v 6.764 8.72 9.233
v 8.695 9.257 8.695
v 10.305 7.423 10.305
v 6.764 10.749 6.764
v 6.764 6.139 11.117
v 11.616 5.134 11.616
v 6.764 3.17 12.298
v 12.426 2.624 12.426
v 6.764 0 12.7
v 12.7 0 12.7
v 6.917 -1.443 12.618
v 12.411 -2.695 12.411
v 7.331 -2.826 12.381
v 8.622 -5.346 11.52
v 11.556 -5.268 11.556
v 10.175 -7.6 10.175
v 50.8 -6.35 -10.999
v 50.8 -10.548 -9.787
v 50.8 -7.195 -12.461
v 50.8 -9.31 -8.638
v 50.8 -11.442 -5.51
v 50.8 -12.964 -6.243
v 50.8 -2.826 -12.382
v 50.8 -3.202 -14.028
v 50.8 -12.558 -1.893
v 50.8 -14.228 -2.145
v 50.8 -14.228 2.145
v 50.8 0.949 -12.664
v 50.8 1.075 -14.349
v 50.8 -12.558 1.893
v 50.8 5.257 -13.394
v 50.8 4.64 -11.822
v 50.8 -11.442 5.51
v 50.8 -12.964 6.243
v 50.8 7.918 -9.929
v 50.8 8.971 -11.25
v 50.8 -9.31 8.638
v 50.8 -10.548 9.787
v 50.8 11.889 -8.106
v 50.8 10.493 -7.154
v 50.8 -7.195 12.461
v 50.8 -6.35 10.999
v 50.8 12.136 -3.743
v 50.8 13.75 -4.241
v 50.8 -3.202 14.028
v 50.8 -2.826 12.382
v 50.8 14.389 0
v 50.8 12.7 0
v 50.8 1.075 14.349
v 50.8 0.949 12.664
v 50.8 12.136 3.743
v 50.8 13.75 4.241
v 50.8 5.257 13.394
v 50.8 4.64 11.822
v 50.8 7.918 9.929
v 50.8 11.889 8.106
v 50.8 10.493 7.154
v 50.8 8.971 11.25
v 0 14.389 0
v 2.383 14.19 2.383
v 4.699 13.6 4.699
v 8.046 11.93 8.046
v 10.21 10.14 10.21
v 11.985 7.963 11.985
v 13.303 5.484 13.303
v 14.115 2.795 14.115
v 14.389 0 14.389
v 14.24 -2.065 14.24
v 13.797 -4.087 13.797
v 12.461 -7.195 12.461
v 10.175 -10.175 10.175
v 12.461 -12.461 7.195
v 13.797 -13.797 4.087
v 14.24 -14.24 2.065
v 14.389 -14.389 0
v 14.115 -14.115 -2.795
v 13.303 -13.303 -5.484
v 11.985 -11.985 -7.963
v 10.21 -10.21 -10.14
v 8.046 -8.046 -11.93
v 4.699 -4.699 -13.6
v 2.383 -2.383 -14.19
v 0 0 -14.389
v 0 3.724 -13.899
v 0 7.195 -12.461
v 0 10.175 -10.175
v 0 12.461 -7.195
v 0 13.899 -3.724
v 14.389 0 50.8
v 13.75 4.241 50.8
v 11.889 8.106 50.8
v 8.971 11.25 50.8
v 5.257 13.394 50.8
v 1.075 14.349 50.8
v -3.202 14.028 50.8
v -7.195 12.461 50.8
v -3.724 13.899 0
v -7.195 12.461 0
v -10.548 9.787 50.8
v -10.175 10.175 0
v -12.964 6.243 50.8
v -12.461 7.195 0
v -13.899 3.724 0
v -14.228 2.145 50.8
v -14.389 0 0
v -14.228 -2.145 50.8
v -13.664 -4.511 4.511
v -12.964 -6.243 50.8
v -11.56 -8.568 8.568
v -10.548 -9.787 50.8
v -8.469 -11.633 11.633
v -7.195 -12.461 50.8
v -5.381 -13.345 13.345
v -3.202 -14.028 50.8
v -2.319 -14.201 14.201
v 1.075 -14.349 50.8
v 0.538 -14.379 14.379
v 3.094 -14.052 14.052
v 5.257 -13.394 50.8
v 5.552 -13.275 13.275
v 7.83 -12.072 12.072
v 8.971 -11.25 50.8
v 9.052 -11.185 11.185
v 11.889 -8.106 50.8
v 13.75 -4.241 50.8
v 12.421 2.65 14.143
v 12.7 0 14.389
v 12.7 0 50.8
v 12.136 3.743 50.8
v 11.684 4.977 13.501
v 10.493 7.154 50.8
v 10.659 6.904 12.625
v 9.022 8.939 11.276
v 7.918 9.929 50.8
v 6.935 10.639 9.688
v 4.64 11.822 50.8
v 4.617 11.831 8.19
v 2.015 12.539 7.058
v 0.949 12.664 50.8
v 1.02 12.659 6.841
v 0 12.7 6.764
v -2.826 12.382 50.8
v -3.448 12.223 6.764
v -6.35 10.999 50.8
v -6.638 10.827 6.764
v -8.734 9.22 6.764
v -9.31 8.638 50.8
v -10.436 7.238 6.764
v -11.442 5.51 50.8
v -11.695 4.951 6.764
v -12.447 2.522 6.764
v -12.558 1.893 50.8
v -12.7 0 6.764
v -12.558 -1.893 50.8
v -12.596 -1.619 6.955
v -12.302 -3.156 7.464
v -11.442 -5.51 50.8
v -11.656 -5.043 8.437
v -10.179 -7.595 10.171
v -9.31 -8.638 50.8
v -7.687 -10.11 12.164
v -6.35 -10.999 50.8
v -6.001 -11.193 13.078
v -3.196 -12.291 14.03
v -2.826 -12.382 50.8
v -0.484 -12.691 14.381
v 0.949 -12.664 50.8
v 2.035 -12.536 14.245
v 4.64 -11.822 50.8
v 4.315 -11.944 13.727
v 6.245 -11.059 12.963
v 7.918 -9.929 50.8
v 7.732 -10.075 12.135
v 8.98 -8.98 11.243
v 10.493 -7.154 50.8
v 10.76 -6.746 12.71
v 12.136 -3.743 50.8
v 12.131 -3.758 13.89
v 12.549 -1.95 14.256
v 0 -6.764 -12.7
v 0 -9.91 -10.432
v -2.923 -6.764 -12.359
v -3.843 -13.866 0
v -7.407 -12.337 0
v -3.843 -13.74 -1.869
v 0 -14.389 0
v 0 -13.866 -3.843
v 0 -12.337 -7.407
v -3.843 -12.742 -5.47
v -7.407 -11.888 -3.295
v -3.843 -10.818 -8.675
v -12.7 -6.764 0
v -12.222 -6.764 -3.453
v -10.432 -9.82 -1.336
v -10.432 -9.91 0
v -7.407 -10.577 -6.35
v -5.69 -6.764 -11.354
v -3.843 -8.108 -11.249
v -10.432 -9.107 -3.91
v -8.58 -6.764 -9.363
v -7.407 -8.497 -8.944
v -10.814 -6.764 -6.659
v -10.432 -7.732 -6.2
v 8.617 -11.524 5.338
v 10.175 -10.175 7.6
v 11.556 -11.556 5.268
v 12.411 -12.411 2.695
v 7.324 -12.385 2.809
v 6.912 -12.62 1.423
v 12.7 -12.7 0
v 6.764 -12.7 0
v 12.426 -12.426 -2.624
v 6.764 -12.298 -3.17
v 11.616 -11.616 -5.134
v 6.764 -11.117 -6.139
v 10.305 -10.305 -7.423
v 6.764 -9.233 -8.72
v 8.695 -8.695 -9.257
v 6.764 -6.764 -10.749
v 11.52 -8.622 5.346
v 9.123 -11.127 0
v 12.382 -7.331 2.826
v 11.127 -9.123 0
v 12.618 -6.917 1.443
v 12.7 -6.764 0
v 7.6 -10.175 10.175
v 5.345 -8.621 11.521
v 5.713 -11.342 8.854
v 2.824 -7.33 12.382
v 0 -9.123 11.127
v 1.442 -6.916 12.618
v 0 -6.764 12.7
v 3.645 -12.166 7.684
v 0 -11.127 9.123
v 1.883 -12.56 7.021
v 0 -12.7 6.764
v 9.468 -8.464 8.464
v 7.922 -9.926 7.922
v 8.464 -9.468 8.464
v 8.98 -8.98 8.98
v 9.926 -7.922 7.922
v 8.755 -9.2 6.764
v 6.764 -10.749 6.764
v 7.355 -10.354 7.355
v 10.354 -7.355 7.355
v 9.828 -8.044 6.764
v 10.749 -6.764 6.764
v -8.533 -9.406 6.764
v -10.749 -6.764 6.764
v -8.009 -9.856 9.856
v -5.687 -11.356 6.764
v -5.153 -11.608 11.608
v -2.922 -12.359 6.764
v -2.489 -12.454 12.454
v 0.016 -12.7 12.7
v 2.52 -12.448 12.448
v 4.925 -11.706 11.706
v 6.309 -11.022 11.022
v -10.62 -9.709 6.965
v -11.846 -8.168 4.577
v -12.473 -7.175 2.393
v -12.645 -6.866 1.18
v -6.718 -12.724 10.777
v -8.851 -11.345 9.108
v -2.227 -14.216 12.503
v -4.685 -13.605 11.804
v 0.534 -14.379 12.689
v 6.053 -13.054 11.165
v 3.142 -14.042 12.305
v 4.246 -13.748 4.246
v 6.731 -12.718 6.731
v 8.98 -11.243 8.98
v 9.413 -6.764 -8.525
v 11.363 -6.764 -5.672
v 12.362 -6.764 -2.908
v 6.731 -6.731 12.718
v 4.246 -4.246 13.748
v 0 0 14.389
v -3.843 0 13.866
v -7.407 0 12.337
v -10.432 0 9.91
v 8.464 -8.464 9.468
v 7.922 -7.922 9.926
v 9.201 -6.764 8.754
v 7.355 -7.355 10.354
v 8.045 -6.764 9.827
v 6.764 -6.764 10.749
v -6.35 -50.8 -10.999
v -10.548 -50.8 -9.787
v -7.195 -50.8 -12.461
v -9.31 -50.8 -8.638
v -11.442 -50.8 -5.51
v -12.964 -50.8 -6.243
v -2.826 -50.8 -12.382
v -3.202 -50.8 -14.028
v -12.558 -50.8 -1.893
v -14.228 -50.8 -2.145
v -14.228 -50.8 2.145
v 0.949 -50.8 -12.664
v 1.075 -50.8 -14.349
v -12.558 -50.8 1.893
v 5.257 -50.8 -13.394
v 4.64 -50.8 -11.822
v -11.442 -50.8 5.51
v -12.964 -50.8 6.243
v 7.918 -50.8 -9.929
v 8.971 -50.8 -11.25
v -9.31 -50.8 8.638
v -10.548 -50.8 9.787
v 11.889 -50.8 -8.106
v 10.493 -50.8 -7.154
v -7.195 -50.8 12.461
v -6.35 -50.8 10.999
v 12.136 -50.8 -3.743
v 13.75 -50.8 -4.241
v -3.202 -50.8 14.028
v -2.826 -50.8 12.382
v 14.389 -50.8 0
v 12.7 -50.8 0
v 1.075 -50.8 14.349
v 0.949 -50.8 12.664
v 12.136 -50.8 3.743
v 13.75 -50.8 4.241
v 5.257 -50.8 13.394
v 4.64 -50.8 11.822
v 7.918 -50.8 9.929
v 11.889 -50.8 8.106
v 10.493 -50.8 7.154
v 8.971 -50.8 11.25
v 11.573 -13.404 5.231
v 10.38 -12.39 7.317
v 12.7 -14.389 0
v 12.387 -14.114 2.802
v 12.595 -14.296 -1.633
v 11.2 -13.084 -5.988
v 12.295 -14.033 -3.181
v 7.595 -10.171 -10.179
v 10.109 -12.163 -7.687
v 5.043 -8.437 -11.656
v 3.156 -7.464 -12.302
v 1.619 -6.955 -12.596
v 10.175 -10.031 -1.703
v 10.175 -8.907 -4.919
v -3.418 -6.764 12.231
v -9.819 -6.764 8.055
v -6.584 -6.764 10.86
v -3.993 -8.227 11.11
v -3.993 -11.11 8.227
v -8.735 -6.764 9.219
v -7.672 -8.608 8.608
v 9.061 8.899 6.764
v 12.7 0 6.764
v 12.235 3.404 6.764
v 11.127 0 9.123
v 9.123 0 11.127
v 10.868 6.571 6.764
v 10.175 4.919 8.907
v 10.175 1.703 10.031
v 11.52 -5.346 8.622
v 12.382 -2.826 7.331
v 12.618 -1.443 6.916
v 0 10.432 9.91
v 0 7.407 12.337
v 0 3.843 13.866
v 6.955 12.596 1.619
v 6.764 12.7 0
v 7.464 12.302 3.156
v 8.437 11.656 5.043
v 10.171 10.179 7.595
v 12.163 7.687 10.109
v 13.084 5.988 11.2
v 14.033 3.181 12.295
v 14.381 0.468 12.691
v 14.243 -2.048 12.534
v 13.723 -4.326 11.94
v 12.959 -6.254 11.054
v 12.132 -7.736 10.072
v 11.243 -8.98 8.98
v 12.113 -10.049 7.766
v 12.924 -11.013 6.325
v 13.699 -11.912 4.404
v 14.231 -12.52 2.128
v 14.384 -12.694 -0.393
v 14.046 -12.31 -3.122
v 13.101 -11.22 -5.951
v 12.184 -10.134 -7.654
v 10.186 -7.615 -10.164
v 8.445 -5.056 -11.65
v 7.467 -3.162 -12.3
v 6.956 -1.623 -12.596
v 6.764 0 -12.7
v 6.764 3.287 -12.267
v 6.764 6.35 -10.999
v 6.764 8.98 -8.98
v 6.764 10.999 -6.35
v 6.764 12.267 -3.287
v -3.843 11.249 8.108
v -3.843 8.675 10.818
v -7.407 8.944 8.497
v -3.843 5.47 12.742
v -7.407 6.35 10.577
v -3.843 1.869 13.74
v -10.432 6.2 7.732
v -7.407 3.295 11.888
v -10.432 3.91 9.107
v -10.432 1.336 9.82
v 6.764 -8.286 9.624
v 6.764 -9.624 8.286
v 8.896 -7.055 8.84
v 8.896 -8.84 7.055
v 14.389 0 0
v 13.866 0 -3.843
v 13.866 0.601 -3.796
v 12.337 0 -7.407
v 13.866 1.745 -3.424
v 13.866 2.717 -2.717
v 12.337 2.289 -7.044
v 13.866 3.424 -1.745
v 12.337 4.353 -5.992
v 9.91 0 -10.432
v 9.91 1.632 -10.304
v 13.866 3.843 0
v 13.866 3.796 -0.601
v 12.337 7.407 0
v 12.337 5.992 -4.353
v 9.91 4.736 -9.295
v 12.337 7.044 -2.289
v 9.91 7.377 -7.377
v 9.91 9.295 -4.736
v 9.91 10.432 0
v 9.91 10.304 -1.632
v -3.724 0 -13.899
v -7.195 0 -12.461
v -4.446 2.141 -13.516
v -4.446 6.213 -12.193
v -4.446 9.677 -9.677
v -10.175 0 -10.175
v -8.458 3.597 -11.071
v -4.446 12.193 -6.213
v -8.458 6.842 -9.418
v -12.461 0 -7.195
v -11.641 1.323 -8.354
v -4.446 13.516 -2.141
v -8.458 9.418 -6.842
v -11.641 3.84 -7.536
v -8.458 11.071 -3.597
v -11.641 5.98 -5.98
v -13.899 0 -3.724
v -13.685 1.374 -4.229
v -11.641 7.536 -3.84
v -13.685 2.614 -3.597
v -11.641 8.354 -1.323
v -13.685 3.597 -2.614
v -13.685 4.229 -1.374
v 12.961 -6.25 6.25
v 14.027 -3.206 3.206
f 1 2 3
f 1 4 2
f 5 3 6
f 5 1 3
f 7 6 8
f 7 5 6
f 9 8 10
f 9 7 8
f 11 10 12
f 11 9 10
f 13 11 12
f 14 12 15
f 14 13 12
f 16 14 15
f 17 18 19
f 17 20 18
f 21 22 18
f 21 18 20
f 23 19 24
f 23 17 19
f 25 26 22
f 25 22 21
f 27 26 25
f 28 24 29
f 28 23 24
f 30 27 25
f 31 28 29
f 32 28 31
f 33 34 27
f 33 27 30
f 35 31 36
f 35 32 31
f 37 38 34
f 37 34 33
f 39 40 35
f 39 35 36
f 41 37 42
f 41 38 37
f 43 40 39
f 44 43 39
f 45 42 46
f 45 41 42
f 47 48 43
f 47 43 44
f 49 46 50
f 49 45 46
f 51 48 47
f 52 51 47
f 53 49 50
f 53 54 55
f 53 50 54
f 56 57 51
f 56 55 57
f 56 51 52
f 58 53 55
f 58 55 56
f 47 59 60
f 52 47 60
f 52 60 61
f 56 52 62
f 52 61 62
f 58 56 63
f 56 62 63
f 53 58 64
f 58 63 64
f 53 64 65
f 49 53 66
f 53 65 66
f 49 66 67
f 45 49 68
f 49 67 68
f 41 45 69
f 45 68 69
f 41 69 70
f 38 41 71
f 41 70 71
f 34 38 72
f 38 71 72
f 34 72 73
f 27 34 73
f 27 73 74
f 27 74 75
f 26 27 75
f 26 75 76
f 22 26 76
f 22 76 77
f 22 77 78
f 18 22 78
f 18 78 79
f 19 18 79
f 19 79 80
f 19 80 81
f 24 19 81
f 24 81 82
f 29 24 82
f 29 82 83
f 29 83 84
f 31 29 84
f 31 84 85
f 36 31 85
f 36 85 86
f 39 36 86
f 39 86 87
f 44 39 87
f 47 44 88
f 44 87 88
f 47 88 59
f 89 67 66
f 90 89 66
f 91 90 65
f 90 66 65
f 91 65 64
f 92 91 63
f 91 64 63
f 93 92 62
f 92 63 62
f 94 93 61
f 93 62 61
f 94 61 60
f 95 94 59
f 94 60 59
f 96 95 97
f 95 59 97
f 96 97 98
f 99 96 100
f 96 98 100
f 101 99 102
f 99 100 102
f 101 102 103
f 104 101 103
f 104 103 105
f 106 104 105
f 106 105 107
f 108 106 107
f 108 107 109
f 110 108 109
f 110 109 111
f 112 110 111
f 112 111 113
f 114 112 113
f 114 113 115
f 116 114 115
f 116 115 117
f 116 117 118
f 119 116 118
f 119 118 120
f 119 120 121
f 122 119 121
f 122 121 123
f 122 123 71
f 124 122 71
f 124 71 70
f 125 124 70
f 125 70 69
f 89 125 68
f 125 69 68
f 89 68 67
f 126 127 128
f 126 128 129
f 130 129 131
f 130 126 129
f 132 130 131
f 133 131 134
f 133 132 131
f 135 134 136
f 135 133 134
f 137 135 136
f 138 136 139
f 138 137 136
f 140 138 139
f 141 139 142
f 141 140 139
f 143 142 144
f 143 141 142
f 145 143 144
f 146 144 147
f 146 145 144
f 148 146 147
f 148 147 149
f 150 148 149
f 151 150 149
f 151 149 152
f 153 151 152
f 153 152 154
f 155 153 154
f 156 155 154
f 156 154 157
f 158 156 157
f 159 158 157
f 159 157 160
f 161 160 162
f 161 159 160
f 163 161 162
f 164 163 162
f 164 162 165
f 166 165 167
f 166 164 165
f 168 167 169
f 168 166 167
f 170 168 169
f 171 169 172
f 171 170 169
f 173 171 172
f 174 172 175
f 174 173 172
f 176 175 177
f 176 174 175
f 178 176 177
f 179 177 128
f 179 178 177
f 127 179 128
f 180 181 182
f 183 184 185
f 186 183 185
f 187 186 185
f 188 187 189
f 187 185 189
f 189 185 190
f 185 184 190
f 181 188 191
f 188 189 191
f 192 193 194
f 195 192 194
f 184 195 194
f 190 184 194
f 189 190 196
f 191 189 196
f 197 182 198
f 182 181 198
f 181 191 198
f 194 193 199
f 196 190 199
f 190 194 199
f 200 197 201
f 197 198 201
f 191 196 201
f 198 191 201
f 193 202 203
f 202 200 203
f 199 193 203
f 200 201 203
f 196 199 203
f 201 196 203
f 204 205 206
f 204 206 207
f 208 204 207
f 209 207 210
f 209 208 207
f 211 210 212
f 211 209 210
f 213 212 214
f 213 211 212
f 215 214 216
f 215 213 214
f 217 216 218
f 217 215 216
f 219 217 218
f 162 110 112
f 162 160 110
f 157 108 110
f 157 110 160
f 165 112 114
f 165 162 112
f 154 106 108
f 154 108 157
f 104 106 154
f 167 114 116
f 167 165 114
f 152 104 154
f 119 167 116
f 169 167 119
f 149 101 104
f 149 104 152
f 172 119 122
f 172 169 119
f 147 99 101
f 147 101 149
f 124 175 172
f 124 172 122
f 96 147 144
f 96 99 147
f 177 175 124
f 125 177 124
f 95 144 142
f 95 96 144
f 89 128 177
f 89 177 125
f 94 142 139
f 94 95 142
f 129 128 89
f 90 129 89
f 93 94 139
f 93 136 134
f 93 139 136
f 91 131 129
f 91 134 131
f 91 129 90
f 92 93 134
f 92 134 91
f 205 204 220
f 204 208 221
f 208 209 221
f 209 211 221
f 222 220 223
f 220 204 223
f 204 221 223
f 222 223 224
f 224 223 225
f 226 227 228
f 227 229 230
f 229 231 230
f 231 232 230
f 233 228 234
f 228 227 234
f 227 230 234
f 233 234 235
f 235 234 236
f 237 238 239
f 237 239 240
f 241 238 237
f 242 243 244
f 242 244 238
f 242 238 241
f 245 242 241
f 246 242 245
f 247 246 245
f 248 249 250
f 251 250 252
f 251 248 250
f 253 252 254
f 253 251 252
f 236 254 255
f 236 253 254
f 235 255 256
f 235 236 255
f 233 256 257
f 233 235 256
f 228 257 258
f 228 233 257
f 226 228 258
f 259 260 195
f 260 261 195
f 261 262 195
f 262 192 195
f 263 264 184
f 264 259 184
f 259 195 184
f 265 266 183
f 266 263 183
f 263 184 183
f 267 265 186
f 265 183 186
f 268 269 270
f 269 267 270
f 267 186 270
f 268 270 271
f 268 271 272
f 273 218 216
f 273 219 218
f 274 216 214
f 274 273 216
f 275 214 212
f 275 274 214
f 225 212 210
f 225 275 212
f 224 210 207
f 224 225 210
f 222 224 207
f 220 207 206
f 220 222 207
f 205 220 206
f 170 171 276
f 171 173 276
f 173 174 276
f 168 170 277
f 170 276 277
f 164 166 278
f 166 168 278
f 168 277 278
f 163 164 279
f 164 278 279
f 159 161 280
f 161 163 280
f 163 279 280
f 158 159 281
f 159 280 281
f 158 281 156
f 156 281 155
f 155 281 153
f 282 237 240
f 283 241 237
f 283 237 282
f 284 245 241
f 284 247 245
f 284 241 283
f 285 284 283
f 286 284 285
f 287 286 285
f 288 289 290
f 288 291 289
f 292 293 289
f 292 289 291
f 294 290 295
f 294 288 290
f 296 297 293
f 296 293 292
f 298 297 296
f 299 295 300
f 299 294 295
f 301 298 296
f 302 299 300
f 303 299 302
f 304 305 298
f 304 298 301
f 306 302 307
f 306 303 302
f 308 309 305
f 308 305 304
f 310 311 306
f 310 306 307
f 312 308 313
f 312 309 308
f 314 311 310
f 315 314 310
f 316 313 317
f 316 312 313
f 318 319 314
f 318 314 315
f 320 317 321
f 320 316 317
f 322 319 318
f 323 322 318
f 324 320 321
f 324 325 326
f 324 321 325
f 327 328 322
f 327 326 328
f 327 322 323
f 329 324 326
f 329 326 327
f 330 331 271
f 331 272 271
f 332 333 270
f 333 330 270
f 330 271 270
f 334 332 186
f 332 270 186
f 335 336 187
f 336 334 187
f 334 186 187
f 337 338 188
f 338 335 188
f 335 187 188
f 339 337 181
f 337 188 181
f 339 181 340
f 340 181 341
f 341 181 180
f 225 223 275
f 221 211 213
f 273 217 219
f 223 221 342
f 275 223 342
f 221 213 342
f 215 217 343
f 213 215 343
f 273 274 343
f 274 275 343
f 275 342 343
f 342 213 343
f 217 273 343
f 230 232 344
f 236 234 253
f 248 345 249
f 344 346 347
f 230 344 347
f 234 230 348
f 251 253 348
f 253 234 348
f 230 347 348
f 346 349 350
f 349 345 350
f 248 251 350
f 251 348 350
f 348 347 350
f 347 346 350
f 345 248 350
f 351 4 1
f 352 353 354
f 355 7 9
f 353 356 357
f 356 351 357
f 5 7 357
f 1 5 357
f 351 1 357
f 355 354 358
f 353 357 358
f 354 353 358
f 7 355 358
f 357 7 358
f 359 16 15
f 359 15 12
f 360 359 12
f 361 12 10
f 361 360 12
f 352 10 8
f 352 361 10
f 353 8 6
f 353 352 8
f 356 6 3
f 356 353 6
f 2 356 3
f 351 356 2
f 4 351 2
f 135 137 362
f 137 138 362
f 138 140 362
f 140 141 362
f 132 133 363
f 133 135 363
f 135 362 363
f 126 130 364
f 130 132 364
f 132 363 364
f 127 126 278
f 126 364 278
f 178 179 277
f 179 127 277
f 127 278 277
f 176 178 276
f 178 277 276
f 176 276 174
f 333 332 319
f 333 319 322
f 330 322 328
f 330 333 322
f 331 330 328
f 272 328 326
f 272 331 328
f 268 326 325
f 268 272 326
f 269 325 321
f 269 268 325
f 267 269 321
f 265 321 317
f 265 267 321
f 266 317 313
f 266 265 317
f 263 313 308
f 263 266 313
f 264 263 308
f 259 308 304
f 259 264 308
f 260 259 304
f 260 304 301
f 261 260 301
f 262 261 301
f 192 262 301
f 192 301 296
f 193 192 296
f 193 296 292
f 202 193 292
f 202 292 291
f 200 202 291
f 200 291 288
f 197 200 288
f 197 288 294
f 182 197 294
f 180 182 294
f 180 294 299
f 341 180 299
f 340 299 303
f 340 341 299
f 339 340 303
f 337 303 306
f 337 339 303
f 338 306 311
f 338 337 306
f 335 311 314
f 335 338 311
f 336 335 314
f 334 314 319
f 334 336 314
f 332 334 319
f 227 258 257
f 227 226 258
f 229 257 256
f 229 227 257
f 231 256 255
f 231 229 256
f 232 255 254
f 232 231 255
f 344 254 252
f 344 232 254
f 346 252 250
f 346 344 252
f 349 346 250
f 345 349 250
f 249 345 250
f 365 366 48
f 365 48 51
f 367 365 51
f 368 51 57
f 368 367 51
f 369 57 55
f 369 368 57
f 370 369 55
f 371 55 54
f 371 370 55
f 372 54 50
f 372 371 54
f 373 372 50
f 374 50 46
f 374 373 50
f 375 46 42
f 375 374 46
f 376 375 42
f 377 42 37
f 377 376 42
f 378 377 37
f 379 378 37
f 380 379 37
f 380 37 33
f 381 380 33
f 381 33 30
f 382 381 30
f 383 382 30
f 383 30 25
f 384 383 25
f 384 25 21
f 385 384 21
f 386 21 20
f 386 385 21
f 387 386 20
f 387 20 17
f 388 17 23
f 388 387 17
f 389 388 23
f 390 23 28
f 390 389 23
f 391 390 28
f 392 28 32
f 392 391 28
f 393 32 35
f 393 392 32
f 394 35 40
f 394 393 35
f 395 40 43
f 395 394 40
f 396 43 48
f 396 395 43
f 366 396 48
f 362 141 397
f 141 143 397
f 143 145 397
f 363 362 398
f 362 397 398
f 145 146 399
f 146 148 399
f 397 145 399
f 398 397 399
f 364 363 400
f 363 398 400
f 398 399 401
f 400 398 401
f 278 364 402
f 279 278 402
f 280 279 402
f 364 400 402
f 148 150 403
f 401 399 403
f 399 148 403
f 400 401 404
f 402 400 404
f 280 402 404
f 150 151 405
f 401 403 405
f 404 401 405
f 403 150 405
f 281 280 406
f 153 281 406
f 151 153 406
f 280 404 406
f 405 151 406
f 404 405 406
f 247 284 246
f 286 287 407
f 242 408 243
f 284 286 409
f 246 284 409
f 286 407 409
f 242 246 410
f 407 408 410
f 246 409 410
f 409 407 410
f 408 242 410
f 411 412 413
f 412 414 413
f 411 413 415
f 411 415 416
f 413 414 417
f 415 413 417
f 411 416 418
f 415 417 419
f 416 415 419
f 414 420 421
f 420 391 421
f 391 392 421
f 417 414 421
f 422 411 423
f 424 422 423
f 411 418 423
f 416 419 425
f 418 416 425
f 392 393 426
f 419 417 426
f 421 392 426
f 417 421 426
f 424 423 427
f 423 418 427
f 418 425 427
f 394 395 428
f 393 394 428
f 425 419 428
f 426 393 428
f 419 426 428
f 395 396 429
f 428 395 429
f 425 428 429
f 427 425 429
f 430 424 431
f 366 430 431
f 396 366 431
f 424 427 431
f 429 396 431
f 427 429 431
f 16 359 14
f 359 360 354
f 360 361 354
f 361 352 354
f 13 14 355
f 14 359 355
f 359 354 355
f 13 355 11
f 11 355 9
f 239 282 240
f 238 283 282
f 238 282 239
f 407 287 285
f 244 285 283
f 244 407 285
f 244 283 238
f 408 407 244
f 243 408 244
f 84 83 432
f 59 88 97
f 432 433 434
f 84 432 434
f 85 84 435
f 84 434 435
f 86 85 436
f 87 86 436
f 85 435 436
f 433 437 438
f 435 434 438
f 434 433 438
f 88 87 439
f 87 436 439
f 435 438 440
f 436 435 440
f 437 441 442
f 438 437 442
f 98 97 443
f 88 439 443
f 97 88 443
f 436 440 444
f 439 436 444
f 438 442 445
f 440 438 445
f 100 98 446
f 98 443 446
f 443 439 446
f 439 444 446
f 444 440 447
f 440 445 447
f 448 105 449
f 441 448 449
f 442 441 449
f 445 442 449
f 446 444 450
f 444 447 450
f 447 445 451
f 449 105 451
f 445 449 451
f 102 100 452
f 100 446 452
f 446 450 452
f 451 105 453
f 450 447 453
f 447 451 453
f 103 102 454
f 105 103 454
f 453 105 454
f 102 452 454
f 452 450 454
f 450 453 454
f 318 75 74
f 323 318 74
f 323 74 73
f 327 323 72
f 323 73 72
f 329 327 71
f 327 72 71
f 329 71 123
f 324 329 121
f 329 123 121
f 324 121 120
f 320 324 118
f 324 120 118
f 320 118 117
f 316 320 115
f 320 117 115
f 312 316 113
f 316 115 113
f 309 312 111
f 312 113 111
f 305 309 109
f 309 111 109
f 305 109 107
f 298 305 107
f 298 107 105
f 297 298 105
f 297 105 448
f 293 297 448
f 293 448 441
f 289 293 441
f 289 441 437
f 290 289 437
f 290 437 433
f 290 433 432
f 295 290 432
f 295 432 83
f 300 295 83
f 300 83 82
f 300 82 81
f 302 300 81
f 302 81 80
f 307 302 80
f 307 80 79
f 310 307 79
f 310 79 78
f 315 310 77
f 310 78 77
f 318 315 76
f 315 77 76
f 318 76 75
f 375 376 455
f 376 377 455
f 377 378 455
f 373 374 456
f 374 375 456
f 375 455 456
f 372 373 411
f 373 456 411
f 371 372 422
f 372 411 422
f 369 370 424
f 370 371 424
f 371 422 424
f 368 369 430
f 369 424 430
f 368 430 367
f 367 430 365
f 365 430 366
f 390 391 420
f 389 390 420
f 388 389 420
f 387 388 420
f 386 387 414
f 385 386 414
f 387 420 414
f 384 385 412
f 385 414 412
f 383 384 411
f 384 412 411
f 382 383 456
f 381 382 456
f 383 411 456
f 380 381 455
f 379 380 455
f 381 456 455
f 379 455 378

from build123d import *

# Parameters (mm, degrees)
F0_R     = 14.3891
F0_R_2   = 12.7
F1_DEPTH = 50.8
F2_R     = 14.3891
F2_R_2   = 12.7
F3_DEPTH = 50.8
F4_R     = 14.3891
F4_R_2   = 12.7
F5_DEPTH = 50.8


with BuildPart() as f1:
    # F0 (on Front) → F1 (new body)
    with BuildSketch(Plane.XZ):
        Circle(F0_R)
        Circle(F0_R_2, mode=Mode.SUBTRACT)
    extrude(amount=F1_DEPTH)

    # F2 (on Right) → F3 (join)
    with BuildSketch(Plane.YZ):
        Circle(F2_R)
        Circle(F2_R_2, mode=Mode.SUBTRACT)
    extrude(amount=F3_DEPTH)

    # F4 (on Top) → F5 (join)
    with BuildSketch(Plane.XY):
        Circle(F4_R)
        Circle(F4_R_2, mode=Mode.SUBTRACT)
    extrude(amount=F5_DEPTH)

    # F6 (on Front) → F7 (revolve)
    with BuildSketch(Plane.XZ):
        with BuildLine():
            ThreePointArc((14.3891, 0), (0, 14.3891), (-14.3891, 0))
            Line((-14.3891, 0), (14.3891, 0))
        make_face()
    revolve(axis=Axis((0, 0, 0), (1, 0, 0)))


solid = f1.part
